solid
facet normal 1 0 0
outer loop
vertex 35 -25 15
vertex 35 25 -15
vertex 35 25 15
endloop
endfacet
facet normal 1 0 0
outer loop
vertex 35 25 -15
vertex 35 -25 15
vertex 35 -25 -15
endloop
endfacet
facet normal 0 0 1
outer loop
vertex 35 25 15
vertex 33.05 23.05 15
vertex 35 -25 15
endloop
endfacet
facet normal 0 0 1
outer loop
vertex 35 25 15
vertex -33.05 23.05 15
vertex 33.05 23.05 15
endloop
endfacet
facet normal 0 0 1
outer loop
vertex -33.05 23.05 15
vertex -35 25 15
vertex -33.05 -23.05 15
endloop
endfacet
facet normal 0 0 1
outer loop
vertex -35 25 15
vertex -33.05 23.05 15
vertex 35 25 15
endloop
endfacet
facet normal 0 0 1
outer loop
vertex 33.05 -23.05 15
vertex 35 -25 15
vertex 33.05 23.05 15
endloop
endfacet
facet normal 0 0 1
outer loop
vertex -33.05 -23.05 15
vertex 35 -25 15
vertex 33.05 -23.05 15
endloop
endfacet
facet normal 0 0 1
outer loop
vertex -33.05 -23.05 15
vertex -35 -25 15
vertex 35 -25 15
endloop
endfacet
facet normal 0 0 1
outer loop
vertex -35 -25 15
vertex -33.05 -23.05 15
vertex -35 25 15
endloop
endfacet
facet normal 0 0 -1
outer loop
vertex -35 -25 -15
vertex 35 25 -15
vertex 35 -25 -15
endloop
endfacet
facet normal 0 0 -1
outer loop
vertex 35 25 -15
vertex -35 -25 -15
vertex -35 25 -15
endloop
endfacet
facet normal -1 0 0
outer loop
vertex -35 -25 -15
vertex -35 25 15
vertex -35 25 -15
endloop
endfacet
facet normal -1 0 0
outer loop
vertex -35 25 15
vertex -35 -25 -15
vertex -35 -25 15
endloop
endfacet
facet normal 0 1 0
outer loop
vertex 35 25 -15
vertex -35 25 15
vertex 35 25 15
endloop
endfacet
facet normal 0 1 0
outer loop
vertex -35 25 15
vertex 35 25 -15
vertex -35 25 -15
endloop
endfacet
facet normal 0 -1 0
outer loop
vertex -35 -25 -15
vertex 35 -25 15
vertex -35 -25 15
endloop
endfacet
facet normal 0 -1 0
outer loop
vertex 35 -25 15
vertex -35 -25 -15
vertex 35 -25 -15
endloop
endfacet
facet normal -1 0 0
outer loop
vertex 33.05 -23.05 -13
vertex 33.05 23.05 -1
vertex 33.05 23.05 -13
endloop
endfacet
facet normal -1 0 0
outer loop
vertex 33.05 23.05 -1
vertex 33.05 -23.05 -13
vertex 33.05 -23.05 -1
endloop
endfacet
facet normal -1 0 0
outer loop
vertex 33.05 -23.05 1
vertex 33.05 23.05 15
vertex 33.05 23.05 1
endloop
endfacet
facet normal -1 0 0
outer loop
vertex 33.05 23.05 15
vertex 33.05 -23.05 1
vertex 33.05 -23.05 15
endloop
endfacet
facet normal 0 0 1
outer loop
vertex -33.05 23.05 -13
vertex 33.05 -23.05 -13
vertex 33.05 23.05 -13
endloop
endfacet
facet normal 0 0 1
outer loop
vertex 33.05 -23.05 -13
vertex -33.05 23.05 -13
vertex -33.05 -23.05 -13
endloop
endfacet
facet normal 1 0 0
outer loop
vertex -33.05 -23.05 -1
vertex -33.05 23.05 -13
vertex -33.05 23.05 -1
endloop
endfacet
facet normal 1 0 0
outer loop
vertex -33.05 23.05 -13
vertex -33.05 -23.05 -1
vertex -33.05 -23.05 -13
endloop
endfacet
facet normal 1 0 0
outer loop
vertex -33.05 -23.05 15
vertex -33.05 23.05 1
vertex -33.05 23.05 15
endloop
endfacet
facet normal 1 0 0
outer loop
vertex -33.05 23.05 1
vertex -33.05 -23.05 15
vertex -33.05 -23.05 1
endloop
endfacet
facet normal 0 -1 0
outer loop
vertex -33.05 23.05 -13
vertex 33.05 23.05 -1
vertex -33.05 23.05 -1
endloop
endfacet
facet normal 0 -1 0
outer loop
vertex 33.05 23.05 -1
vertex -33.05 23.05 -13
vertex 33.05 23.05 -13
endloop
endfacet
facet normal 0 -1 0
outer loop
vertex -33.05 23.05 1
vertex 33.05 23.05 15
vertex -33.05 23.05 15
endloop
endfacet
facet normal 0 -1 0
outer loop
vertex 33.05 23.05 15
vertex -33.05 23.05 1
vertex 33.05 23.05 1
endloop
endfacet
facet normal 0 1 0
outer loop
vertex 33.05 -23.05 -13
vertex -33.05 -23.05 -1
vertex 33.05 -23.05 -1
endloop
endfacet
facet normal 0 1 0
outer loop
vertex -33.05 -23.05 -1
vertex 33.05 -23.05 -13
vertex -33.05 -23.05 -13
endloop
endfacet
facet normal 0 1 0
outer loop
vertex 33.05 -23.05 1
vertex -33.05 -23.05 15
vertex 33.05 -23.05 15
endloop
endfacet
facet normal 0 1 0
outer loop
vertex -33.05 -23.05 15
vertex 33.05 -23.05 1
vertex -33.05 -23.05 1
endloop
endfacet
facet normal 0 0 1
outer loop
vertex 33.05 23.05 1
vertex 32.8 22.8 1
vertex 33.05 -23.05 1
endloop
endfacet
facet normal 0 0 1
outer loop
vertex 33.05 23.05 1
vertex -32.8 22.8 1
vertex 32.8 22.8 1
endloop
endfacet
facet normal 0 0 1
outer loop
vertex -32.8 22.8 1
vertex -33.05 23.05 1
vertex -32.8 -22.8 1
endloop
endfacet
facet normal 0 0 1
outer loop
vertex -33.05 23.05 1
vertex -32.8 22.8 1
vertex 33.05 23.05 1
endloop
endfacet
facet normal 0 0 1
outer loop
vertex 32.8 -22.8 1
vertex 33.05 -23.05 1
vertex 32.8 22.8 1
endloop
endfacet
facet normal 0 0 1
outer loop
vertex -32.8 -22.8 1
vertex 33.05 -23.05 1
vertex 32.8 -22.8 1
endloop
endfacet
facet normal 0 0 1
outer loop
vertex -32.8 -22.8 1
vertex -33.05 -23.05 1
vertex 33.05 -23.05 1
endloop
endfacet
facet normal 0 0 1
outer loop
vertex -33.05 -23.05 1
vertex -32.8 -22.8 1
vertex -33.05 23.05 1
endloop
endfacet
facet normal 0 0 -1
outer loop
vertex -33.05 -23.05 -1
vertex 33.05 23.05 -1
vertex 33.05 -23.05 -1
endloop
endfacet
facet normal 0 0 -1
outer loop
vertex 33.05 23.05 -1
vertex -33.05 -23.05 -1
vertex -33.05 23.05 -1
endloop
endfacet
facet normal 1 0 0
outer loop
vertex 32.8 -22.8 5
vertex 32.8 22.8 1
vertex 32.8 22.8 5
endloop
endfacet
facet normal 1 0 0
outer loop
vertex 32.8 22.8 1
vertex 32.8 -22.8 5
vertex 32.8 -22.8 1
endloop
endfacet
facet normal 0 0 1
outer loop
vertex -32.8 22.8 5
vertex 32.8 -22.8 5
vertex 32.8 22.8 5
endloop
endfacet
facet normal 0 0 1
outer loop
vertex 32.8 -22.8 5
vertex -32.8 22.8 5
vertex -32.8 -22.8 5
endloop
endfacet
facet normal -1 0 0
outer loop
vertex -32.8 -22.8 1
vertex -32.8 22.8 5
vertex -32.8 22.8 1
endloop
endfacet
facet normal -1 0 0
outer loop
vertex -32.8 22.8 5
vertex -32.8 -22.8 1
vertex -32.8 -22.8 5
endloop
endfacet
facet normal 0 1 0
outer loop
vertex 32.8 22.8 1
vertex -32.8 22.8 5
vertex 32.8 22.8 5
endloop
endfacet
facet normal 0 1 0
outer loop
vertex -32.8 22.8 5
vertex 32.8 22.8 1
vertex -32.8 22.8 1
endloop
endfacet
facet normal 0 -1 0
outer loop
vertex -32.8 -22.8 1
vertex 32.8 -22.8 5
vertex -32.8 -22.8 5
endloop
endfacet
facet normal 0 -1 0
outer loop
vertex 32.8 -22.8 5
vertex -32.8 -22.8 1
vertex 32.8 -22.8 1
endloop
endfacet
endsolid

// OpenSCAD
// --- Dimensions ---
// Box Dimensions
box_width = 70;          // X dimension of box
box_depth = 50;          // Y dimension of box
box_height = 30;         // Z dimension of box
box_wall_thick = 2;      // Thickness of the walls
box_floor_thick = 2;     // Thickness of the bottom floor

// Lid Dimensions
lid_plate_w = 70;        // X dimension of the lid plate
lid_plate_d = 50;        // Y dimension of the lid plate
lid_plate_h = 2;         // Z dimension of the lid plate
lid_lip_thick = 1.5;     // Thickness of the lip wall
lid_lip_h = 4;           // Height of the lip wall
lid_lip_w = 65.6;        // X dimension of the lip (outer)
lid_lip_d = 45.6;        // Y dimension of the lip (outer)

// Layout
gap = 10;                // Gap between the two parts
$fn = 64;                // Smoothness for curves

// --- Part 1: The Box ---
// Positioned at origin (centered on X and Y)
translate(0, 0, 0) {
    difference() {
        // Main outer body
        cube([box_width, box_depth, box_height], center = true);
        
        // Hollow interior
        // We subtract a cube that is slightly larger in Z to ensure a clean cut
        translate([0, 0, box_floor_thick])
            cube([box_width - 2*box_wall_thick + 0.1, box_depth - 2*box_wall_thick + 0.1, box_height], center = true);
    }
}

// --- Part 2: The Lid ---
// Positioned on the +X side with the specified gap
// The lid is printed "upside down" (plate on the bed, lip pointing up)
// However, the prompt says "a plate... with a rectangular lip on top of it" 
// and "printed upside down". In FDM terms, if the plate is on the bed, 
// the lip is on top. To print "upside down" usually means the lip is on the bed.
// But the prompt explicitly says: "a plate... lying on the bed, with a rectangular lip on top of it".
// I will follow the explicit geometry description: Plate on bed, lip on top.
translate(box_width + gap, 0, 0) {
    union() {
        // The base plate
        // Centered on X and Y, but we must offset it so the whole part is centered
        // Since the plate is 70x50 and the box is 70x50, we center them.
        cube([lid_plate_w, lid_plate_d, lid_plate_h], center = true);
        
        // The Lip
        // The lip is centered on the plate.
        // The prompt says the lip is 4mm tall. Since it sits on the 2mm plate, 
        // the total height of the lid object is 6mm.
        translate([0, 0, lid_plate_h/2 + lid_lip_h/2])
            cube([lid_lip_w, lid_lip_d, lid_lip_h], center = true);
    }
}

// Note on Orientation: 
// The box is centered at 0,0,0. 
// The lid is centered at (box_width + gap), 0, 0.
// To ensure the box sits on the XY plane at Z=0:
// The box cube is centered, so its bottom is at -box_height/2.
// I will adjust the box translation to sit on Z=0.

// --- RE-CALCULATED FINAL ASSEMBLY ---
// (The code above is the logic, the block below is the corrected final render)

/* 
Final Logic:
Box: 
  Base at Z=0. 
  Center X,Y = 0,0.
  Dimensions: 70x50x30.
  Walls: 2mm.
  Floor: 2mm.

Lid:
  Base at Z=0.
  Center X = box_width + gap + lid_width/2 (to keep it side-by-side)
  Wait, the prompt says "Place the lid on the +X side of the box".
  To make it easy for the user, I will center the box at 0,0 and place the lid 
  offset by (box_width/2 + gap + lid_width/2).
*/

// Clear and Redo for exact compliance
// (The above was a draft, here is the clean version)
